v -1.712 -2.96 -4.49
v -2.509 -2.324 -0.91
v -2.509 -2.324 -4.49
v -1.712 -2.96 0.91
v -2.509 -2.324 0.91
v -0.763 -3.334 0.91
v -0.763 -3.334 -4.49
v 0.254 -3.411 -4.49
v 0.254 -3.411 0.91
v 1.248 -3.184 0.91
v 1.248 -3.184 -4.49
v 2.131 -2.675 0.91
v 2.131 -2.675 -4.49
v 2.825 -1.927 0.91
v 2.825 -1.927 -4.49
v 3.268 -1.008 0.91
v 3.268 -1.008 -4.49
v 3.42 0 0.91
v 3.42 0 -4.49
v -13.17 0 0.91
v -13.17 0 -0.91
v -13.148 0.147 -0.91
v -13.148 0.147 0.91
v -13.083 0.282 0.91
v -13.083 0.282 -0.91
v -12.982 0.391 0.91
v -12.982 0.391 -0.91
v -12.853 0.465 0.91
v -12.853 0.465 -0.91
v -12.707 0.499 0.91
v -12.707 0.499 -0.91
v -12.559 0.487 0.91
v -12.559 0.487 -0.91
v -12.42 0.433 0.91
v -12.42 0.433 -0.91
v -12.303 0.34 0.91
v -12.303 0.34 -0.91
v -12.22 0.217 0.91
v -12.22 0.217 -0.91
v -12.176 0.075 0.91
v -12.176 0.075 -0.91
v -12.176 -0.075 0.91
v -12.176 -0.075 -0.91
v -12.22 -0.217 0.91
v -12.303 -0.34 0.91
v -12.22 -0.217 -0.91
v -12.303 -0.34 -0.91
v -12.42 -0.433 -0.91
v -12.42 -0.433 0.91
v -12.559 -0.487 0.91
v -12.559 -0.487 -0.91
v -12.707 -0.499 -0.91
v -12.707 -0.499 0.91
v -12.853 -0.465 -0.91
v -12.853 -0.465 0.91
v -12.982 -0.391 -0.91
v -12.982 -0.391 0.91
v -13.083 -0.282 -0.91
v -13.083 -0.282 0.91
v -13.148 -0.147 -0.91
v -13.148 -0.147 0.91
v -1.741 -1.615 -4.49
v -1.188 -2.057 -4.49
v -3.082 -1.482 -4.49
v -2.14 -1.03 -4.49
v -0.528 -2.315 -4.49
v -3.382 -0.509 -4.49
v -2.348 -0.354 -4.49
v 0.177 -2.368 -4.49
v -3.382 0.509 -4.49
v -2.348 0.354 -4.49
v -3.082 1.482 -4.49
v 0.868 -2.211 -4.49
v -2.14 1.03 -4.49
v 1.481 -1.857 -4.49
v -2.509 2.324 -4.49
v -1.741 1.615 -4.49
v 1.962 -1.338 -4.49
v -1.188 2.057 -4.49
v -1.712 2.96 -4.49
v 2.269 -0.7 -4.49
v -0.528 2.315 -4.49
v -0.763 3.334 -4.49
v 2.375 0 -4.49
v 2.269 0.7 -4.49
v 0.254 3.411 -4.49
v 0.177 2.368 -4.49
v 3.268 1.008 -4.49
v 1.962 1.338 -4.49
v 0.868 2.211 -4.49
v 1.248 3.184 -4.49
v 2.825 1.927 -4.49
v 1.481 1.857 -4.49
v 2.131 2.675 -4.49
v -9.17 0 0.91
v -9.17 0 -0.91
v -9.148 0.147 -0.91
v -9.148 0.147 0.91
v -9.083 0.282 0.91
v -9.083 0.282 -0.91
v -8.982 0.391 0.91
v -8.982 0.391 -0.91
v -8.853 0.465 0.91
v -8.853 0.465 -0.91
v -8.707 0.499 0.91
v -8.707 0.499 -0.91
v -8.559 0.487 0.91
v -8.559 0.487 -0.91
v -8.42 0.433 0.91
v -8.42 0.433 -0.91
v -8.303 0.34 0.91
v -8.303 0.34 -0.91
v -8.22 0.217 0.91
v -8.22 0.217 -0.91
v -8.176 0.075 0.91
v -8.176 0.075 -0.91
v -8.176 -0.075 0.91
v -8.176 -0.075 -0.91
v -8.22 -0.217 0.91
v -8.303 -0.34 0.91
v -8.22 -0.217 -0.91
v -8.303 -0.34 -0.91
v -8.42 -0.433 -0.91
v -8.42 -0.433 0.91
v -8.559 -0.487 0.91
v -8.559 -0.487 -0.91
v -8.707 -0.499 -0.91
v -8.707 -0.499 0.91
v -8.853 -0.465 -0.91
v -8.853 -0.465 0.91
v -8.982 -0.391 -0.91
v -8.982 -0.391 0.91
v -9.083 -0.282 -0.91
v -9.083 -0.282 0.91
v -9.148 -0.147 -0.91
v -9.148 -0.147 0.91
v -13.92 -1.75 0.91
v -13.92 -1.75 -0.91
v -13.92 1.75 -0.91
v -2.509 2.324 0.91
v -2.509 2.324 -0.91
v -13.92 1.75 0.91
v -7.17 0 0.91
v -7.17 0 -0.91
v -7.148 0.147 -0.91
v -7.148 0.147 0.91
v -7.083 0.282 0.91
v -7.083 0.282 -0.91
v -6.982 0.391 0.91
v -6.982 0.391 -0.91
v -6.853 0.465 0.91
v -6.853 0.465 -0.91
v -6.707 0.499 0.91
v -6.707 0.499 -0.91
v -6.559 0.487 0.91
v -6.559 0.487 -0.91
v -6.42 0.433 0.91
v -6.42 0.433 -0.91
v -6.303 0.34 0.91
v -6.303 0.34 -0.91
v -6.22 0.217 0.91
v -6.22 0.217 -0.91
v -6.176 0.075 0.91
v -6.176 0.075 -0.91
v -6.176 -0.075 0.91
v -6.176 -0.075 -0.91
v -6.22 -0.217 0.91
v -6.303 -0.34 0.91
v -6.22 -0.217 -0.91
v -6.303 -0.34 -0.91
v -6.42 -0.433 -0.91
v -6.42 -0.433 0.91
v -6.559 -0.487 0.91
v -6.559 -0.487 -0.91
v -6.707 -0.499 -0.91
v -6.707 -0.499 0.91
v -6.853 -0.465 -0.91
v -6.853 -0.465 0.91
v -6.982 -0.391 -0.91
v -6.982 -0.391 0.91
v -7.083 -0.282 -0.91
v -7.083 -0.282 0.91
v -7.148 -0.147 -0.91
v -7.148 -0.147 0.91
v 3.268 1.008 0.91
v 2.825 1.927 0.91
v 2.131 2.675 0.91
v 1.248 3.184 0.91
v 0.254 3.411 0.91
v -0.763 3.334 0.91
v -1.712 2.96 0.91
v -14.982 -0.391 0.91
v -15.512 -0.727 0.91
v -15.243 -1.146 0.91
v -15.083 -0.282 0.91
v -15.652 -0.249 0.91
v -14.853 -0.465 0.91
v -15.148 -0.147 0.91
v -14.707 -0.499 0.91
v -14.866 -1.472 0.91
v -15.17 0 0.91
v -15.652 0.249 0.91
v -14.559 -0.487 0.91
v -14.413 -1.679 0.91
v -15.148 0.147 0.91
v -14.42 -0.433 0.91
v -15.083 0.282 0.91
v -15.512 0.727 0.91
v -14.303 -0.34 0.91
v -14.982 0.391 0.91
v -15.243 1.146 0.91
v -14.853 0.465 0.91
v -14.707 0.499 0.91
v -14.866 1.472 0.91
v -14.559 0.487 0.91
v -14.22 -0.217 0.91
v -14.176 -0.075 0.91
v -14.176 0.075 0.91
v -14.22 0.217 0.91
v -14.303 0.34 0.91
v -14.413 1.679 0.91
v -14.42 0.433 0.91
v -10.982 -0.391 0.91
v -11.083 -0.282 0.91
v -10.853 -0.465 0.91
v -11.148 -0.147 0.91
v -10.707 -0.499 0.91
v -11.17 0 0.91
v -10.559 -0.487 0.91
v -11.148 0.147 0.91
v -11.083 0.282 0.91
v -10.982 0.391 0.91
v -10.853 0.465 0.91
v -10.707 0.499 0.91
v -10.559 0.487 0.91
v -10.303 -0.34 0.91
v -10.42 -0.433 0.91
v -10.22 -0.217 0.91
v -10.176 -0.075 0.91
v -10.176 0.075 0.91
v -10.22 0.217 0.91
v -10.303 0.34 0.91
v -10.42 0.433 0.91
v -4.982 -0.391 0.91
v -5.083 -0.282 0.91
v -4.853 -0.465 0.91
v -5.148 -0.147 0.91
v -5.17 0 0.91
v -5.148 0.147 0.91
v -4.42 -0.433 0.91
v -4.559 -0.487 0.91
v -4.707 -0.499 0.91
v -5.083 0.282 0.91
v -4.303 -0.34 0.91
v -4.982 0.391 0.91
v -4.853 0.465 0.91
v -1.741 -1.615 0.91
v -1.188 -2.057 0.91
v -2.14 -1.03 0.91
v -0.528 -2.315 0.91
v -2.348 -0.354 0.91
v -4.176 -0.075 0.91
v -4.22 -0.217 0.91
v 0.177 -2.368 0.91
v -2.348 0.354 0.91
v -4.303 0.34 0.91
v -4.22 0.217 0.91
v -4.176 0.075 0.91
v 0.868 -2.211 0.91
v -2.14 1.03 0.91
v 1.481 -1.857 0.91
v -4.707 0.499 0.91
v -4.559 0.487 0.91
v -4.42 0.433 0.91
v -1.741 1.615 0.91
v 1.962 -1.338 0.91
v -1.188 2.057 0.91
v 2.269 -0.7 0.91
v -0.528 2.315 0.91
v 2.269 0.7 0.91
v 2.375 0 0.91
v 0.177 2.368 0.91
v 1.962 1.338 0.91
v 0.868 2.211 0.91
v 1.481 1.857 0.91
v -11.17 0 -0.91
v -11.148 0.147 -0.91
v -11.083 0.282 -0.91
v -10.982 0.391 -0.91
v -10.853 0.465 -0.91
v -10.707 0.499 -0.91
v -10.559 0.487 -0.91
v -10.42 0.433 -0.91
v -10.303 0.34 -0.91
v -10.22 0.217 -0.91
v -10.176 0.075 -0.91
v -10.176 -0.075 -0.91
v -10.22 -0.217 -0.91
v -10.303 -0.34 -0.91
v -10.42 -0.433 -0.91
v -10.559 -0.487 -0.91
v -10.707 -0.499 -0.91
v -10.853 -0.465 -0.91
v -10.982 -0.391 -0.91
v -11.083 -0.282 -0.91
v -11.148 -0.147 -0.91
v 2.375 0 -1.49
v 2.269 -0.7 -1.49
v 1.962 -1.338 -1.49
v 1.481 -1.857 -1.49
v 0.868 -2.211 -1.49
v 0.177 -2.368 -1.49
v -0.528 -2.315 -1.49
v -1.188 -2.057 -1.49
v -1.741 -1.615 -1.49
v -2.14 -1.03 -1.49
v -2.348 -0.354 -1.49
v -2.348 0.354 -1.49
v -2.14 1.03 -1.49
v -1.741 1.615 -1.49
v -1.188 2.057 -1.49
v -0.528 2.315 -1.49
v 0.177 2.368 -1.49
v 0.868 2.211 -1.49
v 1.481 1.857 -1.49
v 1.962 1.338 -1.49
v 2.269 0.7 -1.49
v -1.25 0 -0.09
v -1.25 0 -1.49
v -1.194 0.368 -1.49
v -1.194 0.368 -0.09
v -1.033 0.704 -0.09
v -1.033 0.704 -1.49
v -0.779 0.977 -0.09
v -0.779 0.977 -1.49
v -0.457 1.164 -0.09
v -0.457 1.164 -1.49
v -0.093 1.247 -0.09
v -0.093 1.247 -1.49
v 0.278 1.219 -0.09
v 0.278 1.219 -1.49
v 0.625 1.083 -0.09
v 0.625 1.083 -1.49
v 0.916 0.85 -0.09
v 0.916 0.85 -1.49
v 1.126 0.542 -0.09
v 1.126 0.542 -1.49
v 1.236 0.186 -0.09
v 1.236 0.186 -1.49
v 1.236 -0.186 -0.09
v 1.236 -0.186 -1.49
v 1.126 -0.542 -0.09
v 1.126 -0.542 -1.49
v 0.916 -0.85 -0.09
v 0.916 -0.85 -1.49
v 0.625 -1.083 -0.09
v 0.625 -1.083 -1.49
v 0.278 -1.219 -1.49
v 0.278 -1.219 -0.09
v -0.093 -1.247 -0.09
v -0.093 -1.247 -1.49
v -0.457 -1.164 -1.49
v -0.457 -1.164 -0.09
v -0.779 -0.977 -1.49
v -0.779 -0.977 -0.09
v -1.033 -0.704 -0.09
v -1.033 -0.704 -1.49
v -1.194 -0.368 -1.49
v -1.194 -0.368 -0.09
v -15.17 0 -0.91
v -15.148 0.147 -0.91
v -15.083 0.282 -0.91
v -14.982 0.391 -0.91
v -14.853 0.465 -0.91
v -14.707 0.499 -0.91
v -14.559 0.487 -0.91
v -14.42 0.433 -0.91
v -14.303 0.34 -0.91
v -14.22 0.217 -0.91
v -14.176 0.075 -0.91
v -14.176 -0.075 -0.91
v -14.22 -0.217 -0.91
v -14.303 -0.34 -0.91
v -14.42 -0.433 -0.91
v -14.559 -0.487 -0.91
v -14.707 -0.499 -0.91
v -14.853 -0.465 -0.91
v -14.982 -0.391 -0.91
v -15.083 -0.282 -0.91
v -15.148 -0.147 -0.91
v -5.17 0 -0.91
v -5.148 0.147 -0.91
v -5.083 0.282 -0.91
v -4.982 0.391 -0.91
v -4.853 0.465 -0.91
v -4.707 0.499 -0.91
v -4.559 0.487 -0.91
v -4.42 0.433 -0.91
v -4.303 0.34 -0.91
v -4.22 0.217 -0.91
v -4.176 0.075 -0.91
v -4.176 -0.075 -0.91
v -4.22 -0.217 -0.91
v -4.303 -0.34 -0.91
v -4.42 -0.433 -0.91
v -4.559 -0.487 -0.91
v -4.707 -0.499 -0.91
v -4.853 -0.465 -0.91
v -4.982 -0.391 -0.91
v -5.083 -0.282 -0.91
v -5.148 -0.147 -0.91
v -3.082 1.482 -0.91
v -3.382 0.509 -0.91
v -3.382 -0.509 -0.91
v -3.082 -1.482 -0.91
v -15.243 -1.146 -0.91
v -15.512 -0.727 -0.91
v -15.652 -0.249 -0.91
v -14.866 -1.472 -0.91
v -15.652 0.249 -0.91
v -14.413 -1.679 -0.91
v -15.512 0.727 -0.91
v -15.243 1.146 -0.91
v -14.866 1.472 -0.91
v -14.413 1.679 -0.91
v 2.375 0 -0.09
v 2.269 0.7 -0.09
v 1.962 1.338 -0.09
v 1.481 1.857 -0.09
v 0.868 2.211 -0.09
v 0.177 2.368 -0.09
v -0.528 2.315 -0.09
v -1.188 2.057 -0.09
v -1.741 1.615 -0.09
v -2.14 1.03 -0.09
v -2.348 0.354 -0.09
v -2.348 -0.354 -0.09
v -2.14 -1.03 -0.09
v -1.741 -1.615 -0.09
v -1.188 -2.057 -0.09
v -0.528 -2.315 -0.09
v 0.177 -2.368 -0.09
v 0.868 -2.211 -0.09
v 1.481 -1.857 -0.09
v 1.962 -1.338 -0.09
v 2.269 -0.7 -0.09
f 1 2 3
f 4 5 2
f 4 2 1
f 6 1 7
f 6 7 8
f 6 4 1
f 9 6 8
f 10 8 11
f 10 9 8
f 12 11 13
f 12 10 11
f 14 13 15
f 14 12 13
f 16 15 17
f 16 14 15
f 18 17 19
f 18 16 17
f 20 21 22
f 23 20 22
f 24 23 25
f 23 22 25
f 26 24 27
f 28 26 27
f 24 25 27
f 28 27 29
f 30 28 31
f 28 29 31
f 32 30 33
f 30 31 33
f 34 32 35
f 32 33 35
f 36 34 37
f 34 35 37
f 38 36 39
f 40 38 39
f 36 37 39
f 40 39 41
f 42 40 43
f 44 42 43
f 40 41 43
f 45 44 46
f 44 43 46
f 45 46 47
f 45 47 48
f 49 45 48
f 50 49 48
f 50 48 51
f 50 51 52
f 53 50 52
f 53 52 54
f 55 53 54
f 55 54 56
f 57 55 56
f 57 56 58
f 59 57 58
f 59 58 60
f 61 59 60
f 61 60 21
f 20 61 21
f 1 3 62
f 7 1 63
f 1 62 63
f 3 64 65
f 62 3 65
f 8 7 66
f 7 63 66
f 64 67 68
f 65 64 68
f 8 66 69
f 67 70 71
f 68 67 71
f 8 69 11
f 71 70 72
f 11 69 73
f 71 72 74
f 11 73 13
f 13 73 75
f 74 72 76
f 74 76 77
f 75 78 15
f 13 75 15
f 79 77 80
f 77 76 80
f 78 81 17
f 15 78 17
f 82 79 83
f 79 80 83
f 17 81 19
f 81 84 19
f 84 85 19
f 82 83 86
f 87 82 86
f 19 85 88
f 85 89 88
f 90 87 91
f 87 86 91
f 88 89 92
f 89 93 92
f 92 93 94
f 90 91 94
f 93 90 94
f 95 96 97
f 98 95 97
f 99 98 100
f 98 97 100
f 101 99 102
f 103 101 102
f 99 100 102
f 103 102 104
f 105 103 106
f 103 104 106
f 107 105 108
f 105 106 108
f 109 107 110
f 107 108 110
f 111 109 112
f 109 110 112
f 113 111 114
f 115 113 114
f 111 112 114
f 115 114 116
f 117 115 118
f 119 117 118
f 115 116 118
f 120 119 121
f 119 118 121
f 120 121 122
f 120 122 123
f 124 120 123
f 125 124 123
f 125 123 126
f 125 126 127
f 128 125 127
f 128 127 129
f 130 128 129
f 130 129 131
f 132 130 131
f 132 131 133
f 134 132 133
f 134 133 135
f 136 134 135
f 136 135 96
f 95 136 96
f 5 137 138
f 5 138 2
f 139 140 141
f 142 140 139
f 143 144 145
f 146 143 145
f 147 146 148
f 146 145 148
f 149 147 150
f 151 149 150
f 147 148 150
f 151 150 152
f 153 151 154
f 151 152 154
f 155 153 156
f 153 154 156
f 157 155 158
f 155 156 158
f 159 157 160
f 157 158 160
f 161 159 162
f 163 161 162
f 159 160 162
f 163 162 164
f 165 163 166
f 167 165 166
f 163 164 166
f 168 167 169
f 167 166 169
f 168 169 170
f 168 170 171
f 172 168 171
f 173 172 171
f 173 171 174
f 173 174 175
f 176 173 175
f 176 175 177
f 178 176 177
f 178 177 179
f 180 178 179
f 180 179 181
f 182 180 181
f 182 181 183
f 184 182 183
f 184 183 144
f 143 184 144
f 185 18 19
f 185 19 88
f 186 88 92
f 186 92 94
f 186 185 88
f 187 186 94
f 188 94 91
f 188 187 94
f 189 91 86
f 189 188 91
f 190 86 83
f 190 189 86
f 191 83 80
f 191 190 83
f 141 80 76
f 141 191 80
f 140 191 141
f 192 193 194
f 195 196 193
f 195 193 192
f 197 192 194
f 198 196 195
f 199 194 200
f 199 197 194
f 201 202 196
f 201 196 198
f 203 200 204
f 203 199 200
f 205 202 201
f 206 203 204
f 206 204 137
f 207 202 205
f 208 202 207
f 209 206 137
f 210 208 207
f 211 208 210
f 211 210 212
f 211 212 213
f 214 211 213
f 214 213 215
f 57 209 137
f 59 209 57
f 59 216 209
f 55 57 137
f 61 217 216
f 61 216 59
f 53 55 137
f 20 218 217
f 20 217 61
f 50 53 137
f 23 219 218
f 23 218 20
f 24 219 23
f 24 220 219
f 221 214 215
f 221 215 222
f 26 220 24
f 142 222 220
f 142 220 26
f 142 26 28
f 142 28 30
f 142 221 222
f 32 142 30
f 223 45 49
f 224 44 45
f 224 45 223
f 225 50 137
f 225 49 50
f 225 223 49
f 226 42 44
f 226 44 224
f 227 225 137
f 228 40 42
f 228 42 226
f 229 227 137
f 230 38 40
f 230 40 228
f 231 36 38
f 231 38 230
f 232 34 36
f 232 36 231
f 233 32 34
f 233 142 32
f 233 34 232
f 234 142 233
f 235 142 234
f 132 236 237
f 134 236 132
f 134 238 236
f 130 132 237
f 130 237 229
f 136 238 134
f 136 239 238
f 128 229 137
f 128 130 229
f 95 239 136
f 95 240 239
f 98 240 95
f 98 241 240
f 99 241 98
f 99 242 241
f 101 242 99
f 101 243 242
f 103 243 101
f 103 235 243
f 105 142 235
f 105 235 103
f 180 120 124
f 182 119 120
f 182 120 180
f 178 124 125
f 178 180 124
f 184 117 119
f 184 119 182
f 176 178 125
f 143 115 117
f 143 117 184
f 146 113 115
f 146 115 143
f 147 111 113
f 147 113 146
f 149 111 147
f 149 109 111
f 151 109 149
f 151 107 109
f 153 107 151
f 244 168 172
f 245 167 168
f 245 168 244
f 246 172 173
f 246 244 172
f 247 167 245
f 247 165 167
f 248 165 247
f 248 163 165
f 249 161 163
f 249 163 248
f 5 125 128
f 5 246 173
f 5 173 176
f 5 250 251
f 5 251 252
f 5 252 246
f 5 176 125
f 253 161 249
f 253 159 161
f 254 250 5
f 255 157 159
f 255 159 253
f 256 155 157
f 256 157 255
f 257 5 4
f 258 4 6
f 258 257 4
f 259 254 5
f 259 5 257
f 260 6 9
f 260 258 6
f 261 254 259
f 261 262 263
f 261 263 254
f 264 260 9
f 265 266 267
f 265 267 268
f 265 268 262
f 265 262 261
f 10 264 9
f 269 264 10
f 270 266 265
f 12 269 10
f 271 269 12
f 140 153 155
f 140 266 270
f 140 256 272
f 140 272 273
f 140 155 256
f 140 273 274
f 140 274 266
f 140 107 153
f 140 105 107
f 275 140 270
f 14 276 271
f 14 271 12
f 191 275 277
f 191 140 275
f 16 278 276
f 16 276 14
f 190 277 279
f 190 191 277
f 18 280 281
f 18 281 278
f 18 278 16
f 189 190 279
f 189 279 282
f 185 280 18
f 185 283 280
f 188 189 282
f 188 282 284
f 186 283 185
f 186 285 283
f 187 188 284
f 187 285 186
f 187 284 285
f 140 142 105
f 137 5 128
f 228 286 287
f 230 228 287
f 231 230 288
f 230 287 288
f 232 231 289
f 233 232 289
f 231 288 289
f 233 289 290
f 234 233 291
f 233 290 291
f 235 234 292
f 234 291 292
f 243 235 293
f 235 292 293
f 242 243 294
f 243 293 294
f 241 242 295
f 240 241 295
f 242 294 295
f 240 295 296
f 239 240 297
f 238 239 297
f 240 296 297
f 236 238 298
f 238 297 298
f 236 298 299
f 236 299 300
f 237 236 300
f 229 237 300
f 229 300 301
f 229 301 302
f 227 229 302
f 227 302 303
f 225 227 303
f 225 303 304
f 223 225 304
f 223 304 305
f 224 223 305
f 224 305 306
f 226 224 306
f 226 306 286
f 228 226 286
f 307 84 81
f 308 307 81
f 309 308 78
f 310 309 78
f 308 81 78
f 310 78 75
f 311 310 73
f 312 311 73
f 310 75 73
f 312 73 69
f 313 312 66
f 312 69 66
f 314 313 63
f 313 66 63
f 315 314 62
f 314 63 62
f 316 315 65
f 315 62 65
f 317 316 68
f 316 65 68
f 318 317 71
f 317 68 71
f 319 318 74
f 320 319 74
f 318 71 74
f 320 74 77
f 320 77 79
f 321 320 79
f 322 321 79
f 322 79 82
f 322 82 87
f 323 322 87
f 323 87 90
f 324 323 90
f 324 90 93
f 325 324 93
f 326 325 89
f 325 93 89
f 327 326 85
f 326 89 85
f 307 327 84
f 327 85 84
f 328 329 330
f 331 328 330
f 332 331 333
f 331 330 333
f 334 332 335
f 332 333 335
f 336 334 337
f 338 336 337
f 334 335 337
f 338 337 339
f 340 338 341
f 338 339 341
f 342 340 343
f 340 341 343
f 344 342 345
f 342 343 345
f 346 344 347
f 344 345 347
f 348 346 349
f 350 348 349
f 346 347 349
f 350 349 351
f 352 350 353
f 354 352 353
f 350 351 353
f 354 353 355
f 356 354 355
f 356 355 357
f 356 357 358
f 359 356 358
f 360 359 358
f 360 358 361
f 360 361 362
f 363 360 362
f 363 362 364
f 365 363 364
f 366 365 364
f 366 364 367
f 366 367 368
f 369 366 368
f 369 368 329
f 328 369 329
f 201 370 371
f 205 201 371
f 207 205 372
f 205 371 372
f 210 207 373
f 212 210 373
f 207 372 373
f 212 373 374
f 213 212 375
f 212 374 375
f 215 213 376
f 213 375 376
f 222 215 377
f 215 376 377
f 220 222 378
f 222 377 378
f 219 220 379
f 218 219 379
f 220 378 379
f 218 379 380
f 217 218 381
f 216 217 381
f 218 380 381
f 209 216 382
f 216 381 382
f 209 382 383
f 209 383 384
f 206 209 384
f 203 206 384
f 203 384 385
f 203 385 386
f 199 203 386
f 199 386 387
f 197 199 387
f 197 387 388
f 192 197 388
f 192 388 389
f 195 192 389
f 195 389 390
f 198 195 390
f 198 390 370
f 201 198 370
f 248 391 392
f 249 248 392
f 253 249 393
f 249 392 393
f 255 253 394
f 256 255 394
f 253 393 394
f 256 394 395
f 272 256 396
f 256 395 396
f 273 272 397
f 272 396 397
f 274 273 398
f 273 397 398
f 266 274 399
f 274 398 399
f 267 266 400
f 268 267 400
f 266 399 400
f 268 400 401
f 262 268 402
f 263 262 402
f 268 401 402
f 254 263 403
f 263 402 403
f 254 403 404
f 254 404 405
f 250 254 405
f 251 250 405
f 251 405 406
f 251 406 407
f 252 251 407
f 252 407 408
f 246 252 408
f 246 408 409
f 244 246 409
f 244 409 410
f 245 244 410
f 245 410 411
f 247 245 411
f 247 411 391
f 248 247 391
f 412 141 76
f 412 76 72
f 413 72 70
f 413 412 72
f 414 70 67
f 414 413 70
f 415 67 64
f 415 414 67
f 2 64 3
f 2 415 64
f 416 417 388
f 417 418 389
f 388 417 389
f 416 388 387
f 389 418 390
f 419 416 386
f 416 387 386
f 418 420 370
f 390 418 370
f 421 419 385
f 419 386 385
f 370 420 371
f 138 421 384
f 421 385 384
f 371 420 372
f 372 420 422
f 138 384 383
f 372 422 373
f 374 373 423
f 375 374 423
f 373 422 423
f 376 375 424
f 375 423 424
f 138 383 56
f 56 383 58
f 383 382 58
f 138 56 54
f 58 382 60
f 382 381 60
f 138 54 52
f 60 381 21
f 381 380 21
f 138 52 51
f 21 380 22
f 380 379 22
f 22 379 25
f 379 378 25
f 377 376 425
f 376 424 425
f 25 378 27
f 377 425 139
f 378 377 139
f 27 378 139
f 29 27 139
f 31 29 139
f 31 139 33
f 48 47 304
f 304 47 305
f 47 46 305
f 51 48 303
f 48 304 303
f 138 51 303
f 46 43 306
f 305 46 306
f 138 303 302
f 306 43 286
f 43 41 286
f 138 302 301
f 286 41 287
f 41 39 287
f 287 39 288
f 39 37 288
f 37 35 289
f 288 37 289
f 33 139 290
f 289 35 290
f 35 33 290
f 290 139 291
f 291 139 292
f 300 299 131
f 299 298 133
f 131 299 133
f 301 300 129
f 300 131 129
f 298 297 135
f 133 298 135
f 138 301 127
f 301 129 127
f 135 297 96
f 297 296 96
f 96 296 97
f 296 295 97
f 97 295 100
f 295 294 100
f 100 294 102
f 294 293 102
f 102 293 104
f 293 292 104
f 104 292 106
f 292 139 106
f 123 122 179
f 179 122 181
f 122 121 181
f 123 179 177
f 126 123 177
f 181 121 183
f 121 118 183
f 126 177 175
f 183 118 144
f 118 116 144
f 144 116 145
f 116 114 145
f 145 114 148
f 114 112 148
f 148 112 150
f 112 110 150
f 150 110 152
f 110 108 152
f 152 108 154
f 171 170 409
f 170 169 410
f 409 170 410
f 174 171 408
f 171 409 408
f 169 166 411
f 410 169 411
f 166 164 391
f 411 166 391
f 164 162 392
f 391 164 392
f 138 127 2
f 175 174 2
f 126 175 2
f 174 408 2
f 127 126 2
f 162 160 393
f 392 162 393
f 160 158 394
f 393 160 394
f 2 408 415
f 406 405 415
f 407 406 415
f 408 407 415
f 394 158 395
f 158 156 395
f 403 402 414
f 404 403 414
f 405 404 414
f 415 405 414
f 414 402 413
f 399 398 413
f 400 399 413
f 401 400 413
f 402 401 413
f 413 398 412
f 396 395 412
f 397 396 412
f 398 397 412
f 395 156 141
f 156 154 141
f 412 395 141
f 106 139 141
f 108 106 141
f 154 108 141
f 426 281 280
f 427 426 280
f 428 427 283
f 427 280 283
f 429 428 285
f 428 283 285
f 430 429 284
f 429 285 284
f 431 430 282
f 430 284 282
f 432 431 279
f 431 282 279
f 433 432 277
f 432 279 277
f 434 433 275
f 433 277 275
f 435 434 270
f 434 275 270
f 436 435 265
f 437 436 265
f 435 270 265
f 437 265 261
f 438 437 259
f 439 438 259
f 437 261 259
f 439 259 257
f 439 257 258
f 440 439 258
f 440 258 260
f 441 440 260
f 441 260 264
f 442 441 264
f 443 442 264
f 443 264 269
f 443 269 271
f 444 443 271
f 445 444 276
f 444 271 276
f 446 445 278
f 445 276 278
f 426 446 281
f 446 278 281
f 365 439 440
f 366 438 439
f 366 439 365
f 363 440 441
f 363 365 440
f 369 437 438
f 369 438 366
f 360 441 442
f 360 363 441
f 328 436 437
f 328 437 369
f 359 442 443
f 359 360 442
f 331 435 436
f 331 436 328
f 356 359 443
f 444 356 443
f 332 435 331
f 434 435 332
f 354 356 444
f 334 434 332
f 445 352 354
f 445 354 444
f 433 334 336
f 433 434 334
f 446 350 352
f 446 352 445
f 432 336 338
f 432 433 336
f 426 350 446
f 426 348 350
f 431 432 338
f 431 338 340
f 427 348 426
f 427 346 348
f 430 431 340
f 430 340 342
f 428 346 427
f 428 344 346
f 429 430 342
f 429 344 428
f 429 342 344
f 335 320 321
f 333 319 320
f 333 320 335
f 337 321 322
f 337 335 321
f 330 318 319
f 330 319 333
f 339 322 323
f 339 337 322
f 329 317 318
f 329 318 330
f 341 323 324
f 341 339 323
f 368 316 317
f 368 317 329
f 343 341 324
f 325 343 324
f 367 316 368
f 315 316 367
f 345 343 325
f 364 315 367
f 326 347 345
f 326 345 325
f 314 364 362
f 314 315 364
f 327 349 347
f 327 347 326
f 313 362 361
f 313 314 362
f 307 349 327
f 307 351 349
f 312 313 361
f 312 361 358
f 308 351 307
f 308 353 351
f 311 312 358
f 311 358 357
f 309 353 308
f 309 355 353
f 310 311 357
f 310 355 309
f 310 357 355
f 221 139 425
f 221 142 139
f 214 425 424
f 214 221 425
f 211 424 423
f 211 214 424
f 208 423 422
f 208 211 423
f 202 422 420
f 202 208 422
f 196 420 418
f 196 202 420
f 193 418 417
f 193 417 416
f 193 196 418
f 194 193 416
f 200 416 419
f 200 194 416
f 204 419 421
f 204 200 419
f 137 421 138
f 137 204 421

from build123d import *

# Parameters (mm, degrees)
F1_DEPTH = 0.91
F3_DEPTH = 5.4
F4_R     = 2.375
F5_DEPTH = 1
F6_R     = 2.375
F7_DEPTH = 3
F9_D     = 2.5
F11_D    = 1


with BuildPart() as f1:
    # F0 (on Top) → F1 (new body, symmetric)
    with BuildSketch(Plane.XY):
        with BuildLine():
            Line((-13.92, -1.75), (-13.92, 1.75))
            ThreePointArc((-13.92, 1.75), (-15.67, 0), (-13.92, -1.75))
        make_face()
        with BuildLine():
            ThreePointArc((-13.92, 1.75), (-12.682563, 1.237437), (-12.17, 0))
            ThreePointArc((-12.17, 0), (-12.682563, -1.237437), (-13.92, -1.75))
            Line((-13.92, -1.75), (0, -2.45))
            Line((0, -2.45), (0, 2.45))
            Line((0, 2.45), (-13.92, 1.75))
        make_face()
        with BuildLine():
            ThreePointArc((-13.92, -1.75), (-12.682563, -1.237437), (-12.17, 0))
            ThreePointArc((-12.17, 0), (-12.682563, 1.237437), (-13.92, 1.75))
            Line((-13.92, 1.75), (-13.92, -1.75))
        make_face()
    extrude(amount=F1_DEPTH, both=True)

    # F2 (on face) → F3 (join)
    with BuildSketch(Plane.XY.offset(0.91)):
        with BuildLine():
            ThreePointArc((-2.509238, -2.323817), (1.24796, -3.184179), (3.42, 0))
            ThreePointArc((3.42, 0), (1.24796, 3.184179), (-2.509238, 2.323817))
            Line((-2.509238, 2.323817), (0, 2.45))
            Line((0, 2.45), (0, -2.45))
            Line((0, -2.45), (-2.509238, -2.323817))
        make_face()
        with BuildLine():
            Line((0, 2.45), (-2.509238, 2.323817))
            ThreePointArc((-2.509238, 2.323817), (-3.42, 0), (-2.509238, -2.323817))
            Line((-2.509238, -2.323817), (0, -2.45))
            Line((0, -2.45), (0, 2.45))
        make_face()
    extrude(amount=-F3_DEPTH)

    # F4 (on face) → F5 (cut)
    with BuildSketch(Plane.XY.offset(0.91)):
        Circle(F4_R)
    extrude(amount=-F5_DEPTH, mode=Mode.SUBTRACT)

    # F6 (on face) → F7 (cut)
    with BuildSketch(Plane(origin=(0, 0, -4.49), x_dir=(1, 0, 0), z_dir=(0, 0, -1))):
        Circle(F6_R)
    extrude(amount=-F7_DEPTH, mode=Mode.SUBTRACT)

    # F9 (through all)
    with Locations(Plane.XY.offset(-0.09)):
        with Locations((0, 0)):
            Hole(F9_D / 2)

    # F11 (through all)
    with Locations(Plane.XY.offset(0.91)):
        with Locations((-14.67, 0), (-12.67, 0), (-10.67, 0), (-8.67, 0), (-6.67, 0), (-4.67, 0)):
            Hole(F11_D / 2)


solid = f1.part
